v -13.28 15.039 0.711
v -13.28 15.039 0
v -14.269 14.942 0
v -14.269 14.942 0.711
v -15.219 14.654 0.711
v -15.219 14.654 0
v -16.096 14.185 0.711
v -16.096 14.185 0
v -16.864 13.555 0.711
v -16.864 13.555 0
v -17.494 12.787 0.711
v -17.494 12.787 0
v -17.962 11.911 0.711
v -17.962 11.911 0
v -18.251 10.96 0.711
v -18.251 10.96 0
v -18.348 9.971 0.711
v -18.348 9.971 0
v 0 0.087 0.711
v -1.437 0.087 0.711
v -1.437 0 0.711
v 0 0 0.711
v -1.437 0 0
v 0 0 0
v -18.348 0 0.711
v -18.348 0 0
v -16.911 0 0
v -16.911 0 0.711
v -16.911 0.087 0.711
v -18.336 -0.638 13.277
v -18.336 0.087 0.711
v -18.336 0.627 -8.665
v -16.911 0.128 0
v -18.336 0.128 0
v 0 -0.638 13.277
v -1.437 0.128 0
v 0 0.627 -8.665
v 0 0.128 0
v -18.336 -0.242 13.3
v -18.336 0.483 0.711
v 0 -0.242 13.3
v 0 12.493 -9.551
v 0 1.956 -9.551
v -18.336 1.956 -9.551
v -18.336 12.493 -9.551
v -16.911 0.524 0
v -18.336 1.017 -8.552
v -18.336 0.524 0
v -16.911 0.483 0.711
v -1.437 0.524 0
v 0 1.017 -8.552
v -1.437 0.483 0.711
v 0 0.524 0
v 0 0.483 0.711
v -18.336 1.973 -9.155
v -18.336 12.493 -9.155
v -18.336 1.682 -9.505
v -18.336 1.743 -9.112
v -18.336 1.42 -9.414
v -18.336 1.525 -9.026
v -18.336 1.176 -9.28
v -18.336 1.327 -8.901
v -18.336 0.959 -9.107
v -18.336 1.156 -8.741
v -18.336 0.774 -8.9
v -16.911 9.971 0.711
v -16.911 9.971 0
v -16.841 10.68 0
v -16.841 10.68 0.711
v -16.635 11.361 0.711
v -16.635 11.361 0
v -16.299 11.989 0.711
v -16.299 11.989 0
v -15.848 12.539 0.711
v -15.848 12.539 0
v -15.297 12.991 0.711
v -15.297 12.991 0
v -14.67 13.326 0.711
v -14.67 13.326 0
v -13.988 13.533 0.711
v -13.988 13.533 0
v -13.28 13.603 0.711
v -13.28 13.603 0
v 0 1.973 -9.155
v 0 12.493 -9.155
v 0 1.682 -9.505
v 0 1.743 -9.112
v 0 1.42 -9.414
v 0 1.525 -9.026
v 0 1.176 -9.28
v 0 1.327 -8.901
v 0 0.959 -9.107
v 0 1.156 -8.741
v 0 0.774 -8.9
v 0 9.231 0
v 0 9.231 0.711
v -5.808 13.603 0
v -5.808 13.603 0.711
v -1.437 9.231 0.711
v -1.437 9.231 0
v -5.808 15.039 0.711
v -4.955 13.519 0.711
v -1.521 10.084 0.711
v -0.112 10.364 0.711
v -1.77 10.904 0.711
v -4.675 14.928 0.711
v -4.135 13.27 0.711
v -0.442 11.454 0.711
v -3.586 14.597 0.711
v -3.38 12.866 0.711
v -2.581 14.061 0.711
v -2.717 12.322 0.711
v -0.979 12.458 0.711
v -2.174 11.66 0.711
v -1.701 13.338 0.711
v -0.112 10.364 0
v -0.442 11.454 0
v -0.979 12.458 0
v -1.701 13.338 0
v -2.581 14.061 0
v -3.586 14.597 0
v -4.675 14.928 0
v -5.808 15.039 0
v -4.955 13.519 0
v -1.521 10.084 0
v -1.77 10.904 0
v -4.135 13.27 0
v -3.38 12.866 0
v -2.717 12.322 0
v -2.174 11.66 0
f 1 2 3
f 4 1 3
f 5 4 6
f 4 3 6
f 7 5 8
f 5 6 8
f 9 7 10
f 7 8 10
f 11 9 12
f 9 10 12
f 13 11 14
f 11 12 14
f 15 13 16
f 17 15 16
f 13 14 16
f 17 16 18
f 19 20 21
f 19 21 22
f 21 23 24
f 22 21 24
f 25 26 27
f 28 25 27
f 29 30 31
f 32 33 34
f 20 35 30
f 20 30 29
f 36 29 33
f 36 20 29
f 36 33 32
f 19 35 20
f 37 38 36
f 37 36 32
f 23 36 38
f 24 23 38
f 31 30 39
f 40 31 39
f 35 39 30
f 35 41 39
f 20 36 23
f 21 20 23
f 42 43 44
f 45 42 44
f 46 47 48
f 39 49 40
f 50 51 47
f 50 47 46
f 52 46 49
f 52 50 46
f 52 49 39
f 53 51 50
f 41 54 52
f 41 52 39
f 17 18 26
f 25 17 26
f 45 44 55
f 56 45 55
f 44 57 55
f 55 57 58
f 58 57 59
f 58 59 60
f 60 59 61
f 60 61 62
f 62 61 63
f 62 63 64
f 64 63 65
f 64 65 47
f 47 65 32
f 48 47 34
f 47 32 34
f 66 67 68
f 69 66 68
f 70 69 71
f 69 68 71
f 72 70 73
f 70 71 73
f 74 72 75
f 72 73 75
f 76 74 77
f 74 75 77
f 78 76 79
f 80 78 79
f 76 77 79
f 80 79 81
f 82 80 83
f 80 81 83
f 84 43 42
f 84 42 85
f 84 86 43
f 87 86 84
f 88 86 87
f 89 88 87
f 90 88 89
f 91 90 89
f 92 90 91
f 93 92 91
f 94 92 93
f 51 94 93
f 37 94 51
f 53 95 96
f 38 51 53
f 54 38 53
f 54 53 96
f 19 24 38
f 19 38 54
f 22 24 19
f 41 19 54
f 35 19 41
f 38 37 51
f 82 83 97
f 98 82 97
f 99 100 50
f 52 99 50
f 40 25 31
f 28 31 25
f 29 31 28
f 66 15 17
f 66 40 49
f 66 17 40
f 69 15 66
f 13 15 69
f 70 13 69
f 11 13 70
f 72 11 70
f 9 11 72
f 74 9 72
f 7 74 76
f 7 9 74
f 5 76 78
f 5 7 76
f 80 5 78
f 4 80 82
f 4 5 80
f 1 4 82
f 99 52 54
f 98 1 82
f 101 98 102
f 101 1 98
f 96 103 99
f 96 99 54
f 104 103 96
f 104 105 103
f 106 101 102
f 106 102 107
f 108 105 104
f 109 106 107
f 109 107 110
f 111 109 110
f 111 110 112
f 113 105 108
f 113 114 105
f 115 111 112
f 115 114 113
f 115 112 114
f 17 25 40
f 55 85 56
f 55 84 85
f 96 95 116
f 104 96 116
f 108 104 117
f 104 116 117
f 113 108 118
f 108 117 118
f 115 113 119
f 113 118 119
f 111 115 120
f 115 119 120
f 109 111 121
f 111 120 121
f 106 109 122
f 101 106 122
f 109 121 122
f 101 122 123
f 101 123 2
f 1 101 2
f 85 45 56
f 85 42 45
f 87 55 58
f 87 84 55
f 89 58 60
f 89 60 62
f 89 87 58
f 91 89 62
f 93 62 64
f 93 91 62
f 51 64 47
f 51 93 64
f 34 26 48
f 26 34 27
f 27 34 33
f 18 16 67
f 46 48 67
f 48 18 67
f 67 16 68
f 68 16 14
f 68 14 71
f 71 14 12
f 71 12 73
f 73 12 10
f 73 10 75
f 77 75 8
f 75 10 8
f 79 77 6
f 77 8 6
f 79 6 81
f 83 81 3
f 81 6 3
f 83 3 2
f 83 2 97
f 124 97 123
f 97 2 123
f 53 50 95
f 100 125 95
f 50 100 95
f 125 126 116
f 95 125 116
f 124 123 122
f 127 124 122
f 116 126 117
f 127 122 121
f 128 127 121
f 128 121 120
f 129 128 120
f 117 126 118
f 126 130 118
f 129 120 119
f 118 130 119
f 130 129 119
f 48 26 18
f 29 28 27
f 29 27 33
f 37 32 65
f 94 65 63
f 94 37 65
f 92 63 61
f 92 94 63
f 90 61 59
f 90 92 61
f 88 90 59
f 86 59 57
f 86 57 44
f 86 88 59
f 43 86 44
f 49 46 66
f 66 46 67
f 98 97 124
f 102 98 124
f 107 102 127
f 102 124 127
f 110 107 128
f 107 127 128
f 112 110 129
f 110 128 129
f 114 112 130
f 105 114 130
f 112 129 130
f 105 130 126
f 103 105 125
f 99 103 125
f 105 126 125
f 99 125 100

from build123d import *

# Parameters (mm, degrees)
F2_DEPTH = 1.651
F3_DEPTH = 0.7112
F4_DEPTH = 16.68526
F5_DEPTH = 2.1082


with BuildPart() as f2:
    # F1 (on Right) → F2 (new body)
    with BuildSketch(Plane.YZ):
        with BuildLine():
            Line((-0.2421069604, 13.3002023897), (-0.6375133526, 13.2774123922))
            Line((-0.6375133526, 13.2774123922), (0.6271508173, -8.6645074189))
            ThreePointArc((0.6271508173, -8.6645074189), (1.1764445867, -9.2804609215), (1.9562288653, -9.5507549122))
            Line((1.9562288653, -9.5507549122), (10.3850932792, -9.5507549122))
            Line((10.3850932792, -9.5507549122), (10.3850932792, -9.1546922922))
            Line((10.3850932792, -9.1546922922), (1.9730122271, -9.1546922922))
            ThreePointArc((1.9730122271, -9.1546922922), (1.4228217611, -8.9682207065), (1.0173951252, -8.552155274))
            Line((1.0173951252, -8.552155274), (-0.2421069604, 13.3002023897))
        make_face()
    extrude(amount=-F2_DEPTH)

    # F0 (on Top) → F3 (join)
    with BuildSketch(Plane.XY):
        with BuildLine():
            ThreePointArc((0, 9.231187034), (-1.7012077985, 13.3382659736), (-5.808286738, 15.039473772))
            Line((-5.808286738, 15.039473772), (-13.2799016967, 15.039473772))
            ThreePointArc((-13.2799016967, 15.039473772), (-16.8636996774, 13.5550160436), (-18.3481574059, 9.9712180629))
            Line((-18.3481574059, 9.9712180629), (-18.3481574059, 0))
            Line((-18.3481574059, 0), (-16.9112477452, 0))
            Line((-16.9112477452, 0), (-16.9112477452, 9.9712180629))
            ThreePointArc((-16.9112477452, 9.9712180629), (-15.8476511124, 12.5389674786), (-13.2799016967, 13.6025641114))
            Line((-13.2799016967, 13.6025641114), (-5.808286738, 13.6025641114))
            ThreePointArc((-5.808286738, 13.6025641114), (-2.7172563635, 12.3222174085), (-1.4369096607, 9.231187034))
            Line((-1.4369096607, 9.231187034), (-1.4369096607, 0))
            Line((-1.4369096607, 0), (0, 0))
            Line((0, 0), (0, 9.231187034))
        make_face()
    extrude(amount=F3_DEPTH)

    # F4 (add): a face of the model
    f4_faces = [f2.faces().sort_by_distance(p)[0] for p in [
        (-1.651, -0.4252115949, 13.0355223881),
    ]]
    extrude(f4_faces, amount=F4_DEPTH)

    # F5 (add): a face of the model
    f5_faces = [f2.faces().sort_by_distance(p)[0] for p in [
        (-9.16813, 10.3850932792, -9.3527236022),
    ]]
    extrude(f5_faces, amount=F5_DEPTH)


solid = f2.part
